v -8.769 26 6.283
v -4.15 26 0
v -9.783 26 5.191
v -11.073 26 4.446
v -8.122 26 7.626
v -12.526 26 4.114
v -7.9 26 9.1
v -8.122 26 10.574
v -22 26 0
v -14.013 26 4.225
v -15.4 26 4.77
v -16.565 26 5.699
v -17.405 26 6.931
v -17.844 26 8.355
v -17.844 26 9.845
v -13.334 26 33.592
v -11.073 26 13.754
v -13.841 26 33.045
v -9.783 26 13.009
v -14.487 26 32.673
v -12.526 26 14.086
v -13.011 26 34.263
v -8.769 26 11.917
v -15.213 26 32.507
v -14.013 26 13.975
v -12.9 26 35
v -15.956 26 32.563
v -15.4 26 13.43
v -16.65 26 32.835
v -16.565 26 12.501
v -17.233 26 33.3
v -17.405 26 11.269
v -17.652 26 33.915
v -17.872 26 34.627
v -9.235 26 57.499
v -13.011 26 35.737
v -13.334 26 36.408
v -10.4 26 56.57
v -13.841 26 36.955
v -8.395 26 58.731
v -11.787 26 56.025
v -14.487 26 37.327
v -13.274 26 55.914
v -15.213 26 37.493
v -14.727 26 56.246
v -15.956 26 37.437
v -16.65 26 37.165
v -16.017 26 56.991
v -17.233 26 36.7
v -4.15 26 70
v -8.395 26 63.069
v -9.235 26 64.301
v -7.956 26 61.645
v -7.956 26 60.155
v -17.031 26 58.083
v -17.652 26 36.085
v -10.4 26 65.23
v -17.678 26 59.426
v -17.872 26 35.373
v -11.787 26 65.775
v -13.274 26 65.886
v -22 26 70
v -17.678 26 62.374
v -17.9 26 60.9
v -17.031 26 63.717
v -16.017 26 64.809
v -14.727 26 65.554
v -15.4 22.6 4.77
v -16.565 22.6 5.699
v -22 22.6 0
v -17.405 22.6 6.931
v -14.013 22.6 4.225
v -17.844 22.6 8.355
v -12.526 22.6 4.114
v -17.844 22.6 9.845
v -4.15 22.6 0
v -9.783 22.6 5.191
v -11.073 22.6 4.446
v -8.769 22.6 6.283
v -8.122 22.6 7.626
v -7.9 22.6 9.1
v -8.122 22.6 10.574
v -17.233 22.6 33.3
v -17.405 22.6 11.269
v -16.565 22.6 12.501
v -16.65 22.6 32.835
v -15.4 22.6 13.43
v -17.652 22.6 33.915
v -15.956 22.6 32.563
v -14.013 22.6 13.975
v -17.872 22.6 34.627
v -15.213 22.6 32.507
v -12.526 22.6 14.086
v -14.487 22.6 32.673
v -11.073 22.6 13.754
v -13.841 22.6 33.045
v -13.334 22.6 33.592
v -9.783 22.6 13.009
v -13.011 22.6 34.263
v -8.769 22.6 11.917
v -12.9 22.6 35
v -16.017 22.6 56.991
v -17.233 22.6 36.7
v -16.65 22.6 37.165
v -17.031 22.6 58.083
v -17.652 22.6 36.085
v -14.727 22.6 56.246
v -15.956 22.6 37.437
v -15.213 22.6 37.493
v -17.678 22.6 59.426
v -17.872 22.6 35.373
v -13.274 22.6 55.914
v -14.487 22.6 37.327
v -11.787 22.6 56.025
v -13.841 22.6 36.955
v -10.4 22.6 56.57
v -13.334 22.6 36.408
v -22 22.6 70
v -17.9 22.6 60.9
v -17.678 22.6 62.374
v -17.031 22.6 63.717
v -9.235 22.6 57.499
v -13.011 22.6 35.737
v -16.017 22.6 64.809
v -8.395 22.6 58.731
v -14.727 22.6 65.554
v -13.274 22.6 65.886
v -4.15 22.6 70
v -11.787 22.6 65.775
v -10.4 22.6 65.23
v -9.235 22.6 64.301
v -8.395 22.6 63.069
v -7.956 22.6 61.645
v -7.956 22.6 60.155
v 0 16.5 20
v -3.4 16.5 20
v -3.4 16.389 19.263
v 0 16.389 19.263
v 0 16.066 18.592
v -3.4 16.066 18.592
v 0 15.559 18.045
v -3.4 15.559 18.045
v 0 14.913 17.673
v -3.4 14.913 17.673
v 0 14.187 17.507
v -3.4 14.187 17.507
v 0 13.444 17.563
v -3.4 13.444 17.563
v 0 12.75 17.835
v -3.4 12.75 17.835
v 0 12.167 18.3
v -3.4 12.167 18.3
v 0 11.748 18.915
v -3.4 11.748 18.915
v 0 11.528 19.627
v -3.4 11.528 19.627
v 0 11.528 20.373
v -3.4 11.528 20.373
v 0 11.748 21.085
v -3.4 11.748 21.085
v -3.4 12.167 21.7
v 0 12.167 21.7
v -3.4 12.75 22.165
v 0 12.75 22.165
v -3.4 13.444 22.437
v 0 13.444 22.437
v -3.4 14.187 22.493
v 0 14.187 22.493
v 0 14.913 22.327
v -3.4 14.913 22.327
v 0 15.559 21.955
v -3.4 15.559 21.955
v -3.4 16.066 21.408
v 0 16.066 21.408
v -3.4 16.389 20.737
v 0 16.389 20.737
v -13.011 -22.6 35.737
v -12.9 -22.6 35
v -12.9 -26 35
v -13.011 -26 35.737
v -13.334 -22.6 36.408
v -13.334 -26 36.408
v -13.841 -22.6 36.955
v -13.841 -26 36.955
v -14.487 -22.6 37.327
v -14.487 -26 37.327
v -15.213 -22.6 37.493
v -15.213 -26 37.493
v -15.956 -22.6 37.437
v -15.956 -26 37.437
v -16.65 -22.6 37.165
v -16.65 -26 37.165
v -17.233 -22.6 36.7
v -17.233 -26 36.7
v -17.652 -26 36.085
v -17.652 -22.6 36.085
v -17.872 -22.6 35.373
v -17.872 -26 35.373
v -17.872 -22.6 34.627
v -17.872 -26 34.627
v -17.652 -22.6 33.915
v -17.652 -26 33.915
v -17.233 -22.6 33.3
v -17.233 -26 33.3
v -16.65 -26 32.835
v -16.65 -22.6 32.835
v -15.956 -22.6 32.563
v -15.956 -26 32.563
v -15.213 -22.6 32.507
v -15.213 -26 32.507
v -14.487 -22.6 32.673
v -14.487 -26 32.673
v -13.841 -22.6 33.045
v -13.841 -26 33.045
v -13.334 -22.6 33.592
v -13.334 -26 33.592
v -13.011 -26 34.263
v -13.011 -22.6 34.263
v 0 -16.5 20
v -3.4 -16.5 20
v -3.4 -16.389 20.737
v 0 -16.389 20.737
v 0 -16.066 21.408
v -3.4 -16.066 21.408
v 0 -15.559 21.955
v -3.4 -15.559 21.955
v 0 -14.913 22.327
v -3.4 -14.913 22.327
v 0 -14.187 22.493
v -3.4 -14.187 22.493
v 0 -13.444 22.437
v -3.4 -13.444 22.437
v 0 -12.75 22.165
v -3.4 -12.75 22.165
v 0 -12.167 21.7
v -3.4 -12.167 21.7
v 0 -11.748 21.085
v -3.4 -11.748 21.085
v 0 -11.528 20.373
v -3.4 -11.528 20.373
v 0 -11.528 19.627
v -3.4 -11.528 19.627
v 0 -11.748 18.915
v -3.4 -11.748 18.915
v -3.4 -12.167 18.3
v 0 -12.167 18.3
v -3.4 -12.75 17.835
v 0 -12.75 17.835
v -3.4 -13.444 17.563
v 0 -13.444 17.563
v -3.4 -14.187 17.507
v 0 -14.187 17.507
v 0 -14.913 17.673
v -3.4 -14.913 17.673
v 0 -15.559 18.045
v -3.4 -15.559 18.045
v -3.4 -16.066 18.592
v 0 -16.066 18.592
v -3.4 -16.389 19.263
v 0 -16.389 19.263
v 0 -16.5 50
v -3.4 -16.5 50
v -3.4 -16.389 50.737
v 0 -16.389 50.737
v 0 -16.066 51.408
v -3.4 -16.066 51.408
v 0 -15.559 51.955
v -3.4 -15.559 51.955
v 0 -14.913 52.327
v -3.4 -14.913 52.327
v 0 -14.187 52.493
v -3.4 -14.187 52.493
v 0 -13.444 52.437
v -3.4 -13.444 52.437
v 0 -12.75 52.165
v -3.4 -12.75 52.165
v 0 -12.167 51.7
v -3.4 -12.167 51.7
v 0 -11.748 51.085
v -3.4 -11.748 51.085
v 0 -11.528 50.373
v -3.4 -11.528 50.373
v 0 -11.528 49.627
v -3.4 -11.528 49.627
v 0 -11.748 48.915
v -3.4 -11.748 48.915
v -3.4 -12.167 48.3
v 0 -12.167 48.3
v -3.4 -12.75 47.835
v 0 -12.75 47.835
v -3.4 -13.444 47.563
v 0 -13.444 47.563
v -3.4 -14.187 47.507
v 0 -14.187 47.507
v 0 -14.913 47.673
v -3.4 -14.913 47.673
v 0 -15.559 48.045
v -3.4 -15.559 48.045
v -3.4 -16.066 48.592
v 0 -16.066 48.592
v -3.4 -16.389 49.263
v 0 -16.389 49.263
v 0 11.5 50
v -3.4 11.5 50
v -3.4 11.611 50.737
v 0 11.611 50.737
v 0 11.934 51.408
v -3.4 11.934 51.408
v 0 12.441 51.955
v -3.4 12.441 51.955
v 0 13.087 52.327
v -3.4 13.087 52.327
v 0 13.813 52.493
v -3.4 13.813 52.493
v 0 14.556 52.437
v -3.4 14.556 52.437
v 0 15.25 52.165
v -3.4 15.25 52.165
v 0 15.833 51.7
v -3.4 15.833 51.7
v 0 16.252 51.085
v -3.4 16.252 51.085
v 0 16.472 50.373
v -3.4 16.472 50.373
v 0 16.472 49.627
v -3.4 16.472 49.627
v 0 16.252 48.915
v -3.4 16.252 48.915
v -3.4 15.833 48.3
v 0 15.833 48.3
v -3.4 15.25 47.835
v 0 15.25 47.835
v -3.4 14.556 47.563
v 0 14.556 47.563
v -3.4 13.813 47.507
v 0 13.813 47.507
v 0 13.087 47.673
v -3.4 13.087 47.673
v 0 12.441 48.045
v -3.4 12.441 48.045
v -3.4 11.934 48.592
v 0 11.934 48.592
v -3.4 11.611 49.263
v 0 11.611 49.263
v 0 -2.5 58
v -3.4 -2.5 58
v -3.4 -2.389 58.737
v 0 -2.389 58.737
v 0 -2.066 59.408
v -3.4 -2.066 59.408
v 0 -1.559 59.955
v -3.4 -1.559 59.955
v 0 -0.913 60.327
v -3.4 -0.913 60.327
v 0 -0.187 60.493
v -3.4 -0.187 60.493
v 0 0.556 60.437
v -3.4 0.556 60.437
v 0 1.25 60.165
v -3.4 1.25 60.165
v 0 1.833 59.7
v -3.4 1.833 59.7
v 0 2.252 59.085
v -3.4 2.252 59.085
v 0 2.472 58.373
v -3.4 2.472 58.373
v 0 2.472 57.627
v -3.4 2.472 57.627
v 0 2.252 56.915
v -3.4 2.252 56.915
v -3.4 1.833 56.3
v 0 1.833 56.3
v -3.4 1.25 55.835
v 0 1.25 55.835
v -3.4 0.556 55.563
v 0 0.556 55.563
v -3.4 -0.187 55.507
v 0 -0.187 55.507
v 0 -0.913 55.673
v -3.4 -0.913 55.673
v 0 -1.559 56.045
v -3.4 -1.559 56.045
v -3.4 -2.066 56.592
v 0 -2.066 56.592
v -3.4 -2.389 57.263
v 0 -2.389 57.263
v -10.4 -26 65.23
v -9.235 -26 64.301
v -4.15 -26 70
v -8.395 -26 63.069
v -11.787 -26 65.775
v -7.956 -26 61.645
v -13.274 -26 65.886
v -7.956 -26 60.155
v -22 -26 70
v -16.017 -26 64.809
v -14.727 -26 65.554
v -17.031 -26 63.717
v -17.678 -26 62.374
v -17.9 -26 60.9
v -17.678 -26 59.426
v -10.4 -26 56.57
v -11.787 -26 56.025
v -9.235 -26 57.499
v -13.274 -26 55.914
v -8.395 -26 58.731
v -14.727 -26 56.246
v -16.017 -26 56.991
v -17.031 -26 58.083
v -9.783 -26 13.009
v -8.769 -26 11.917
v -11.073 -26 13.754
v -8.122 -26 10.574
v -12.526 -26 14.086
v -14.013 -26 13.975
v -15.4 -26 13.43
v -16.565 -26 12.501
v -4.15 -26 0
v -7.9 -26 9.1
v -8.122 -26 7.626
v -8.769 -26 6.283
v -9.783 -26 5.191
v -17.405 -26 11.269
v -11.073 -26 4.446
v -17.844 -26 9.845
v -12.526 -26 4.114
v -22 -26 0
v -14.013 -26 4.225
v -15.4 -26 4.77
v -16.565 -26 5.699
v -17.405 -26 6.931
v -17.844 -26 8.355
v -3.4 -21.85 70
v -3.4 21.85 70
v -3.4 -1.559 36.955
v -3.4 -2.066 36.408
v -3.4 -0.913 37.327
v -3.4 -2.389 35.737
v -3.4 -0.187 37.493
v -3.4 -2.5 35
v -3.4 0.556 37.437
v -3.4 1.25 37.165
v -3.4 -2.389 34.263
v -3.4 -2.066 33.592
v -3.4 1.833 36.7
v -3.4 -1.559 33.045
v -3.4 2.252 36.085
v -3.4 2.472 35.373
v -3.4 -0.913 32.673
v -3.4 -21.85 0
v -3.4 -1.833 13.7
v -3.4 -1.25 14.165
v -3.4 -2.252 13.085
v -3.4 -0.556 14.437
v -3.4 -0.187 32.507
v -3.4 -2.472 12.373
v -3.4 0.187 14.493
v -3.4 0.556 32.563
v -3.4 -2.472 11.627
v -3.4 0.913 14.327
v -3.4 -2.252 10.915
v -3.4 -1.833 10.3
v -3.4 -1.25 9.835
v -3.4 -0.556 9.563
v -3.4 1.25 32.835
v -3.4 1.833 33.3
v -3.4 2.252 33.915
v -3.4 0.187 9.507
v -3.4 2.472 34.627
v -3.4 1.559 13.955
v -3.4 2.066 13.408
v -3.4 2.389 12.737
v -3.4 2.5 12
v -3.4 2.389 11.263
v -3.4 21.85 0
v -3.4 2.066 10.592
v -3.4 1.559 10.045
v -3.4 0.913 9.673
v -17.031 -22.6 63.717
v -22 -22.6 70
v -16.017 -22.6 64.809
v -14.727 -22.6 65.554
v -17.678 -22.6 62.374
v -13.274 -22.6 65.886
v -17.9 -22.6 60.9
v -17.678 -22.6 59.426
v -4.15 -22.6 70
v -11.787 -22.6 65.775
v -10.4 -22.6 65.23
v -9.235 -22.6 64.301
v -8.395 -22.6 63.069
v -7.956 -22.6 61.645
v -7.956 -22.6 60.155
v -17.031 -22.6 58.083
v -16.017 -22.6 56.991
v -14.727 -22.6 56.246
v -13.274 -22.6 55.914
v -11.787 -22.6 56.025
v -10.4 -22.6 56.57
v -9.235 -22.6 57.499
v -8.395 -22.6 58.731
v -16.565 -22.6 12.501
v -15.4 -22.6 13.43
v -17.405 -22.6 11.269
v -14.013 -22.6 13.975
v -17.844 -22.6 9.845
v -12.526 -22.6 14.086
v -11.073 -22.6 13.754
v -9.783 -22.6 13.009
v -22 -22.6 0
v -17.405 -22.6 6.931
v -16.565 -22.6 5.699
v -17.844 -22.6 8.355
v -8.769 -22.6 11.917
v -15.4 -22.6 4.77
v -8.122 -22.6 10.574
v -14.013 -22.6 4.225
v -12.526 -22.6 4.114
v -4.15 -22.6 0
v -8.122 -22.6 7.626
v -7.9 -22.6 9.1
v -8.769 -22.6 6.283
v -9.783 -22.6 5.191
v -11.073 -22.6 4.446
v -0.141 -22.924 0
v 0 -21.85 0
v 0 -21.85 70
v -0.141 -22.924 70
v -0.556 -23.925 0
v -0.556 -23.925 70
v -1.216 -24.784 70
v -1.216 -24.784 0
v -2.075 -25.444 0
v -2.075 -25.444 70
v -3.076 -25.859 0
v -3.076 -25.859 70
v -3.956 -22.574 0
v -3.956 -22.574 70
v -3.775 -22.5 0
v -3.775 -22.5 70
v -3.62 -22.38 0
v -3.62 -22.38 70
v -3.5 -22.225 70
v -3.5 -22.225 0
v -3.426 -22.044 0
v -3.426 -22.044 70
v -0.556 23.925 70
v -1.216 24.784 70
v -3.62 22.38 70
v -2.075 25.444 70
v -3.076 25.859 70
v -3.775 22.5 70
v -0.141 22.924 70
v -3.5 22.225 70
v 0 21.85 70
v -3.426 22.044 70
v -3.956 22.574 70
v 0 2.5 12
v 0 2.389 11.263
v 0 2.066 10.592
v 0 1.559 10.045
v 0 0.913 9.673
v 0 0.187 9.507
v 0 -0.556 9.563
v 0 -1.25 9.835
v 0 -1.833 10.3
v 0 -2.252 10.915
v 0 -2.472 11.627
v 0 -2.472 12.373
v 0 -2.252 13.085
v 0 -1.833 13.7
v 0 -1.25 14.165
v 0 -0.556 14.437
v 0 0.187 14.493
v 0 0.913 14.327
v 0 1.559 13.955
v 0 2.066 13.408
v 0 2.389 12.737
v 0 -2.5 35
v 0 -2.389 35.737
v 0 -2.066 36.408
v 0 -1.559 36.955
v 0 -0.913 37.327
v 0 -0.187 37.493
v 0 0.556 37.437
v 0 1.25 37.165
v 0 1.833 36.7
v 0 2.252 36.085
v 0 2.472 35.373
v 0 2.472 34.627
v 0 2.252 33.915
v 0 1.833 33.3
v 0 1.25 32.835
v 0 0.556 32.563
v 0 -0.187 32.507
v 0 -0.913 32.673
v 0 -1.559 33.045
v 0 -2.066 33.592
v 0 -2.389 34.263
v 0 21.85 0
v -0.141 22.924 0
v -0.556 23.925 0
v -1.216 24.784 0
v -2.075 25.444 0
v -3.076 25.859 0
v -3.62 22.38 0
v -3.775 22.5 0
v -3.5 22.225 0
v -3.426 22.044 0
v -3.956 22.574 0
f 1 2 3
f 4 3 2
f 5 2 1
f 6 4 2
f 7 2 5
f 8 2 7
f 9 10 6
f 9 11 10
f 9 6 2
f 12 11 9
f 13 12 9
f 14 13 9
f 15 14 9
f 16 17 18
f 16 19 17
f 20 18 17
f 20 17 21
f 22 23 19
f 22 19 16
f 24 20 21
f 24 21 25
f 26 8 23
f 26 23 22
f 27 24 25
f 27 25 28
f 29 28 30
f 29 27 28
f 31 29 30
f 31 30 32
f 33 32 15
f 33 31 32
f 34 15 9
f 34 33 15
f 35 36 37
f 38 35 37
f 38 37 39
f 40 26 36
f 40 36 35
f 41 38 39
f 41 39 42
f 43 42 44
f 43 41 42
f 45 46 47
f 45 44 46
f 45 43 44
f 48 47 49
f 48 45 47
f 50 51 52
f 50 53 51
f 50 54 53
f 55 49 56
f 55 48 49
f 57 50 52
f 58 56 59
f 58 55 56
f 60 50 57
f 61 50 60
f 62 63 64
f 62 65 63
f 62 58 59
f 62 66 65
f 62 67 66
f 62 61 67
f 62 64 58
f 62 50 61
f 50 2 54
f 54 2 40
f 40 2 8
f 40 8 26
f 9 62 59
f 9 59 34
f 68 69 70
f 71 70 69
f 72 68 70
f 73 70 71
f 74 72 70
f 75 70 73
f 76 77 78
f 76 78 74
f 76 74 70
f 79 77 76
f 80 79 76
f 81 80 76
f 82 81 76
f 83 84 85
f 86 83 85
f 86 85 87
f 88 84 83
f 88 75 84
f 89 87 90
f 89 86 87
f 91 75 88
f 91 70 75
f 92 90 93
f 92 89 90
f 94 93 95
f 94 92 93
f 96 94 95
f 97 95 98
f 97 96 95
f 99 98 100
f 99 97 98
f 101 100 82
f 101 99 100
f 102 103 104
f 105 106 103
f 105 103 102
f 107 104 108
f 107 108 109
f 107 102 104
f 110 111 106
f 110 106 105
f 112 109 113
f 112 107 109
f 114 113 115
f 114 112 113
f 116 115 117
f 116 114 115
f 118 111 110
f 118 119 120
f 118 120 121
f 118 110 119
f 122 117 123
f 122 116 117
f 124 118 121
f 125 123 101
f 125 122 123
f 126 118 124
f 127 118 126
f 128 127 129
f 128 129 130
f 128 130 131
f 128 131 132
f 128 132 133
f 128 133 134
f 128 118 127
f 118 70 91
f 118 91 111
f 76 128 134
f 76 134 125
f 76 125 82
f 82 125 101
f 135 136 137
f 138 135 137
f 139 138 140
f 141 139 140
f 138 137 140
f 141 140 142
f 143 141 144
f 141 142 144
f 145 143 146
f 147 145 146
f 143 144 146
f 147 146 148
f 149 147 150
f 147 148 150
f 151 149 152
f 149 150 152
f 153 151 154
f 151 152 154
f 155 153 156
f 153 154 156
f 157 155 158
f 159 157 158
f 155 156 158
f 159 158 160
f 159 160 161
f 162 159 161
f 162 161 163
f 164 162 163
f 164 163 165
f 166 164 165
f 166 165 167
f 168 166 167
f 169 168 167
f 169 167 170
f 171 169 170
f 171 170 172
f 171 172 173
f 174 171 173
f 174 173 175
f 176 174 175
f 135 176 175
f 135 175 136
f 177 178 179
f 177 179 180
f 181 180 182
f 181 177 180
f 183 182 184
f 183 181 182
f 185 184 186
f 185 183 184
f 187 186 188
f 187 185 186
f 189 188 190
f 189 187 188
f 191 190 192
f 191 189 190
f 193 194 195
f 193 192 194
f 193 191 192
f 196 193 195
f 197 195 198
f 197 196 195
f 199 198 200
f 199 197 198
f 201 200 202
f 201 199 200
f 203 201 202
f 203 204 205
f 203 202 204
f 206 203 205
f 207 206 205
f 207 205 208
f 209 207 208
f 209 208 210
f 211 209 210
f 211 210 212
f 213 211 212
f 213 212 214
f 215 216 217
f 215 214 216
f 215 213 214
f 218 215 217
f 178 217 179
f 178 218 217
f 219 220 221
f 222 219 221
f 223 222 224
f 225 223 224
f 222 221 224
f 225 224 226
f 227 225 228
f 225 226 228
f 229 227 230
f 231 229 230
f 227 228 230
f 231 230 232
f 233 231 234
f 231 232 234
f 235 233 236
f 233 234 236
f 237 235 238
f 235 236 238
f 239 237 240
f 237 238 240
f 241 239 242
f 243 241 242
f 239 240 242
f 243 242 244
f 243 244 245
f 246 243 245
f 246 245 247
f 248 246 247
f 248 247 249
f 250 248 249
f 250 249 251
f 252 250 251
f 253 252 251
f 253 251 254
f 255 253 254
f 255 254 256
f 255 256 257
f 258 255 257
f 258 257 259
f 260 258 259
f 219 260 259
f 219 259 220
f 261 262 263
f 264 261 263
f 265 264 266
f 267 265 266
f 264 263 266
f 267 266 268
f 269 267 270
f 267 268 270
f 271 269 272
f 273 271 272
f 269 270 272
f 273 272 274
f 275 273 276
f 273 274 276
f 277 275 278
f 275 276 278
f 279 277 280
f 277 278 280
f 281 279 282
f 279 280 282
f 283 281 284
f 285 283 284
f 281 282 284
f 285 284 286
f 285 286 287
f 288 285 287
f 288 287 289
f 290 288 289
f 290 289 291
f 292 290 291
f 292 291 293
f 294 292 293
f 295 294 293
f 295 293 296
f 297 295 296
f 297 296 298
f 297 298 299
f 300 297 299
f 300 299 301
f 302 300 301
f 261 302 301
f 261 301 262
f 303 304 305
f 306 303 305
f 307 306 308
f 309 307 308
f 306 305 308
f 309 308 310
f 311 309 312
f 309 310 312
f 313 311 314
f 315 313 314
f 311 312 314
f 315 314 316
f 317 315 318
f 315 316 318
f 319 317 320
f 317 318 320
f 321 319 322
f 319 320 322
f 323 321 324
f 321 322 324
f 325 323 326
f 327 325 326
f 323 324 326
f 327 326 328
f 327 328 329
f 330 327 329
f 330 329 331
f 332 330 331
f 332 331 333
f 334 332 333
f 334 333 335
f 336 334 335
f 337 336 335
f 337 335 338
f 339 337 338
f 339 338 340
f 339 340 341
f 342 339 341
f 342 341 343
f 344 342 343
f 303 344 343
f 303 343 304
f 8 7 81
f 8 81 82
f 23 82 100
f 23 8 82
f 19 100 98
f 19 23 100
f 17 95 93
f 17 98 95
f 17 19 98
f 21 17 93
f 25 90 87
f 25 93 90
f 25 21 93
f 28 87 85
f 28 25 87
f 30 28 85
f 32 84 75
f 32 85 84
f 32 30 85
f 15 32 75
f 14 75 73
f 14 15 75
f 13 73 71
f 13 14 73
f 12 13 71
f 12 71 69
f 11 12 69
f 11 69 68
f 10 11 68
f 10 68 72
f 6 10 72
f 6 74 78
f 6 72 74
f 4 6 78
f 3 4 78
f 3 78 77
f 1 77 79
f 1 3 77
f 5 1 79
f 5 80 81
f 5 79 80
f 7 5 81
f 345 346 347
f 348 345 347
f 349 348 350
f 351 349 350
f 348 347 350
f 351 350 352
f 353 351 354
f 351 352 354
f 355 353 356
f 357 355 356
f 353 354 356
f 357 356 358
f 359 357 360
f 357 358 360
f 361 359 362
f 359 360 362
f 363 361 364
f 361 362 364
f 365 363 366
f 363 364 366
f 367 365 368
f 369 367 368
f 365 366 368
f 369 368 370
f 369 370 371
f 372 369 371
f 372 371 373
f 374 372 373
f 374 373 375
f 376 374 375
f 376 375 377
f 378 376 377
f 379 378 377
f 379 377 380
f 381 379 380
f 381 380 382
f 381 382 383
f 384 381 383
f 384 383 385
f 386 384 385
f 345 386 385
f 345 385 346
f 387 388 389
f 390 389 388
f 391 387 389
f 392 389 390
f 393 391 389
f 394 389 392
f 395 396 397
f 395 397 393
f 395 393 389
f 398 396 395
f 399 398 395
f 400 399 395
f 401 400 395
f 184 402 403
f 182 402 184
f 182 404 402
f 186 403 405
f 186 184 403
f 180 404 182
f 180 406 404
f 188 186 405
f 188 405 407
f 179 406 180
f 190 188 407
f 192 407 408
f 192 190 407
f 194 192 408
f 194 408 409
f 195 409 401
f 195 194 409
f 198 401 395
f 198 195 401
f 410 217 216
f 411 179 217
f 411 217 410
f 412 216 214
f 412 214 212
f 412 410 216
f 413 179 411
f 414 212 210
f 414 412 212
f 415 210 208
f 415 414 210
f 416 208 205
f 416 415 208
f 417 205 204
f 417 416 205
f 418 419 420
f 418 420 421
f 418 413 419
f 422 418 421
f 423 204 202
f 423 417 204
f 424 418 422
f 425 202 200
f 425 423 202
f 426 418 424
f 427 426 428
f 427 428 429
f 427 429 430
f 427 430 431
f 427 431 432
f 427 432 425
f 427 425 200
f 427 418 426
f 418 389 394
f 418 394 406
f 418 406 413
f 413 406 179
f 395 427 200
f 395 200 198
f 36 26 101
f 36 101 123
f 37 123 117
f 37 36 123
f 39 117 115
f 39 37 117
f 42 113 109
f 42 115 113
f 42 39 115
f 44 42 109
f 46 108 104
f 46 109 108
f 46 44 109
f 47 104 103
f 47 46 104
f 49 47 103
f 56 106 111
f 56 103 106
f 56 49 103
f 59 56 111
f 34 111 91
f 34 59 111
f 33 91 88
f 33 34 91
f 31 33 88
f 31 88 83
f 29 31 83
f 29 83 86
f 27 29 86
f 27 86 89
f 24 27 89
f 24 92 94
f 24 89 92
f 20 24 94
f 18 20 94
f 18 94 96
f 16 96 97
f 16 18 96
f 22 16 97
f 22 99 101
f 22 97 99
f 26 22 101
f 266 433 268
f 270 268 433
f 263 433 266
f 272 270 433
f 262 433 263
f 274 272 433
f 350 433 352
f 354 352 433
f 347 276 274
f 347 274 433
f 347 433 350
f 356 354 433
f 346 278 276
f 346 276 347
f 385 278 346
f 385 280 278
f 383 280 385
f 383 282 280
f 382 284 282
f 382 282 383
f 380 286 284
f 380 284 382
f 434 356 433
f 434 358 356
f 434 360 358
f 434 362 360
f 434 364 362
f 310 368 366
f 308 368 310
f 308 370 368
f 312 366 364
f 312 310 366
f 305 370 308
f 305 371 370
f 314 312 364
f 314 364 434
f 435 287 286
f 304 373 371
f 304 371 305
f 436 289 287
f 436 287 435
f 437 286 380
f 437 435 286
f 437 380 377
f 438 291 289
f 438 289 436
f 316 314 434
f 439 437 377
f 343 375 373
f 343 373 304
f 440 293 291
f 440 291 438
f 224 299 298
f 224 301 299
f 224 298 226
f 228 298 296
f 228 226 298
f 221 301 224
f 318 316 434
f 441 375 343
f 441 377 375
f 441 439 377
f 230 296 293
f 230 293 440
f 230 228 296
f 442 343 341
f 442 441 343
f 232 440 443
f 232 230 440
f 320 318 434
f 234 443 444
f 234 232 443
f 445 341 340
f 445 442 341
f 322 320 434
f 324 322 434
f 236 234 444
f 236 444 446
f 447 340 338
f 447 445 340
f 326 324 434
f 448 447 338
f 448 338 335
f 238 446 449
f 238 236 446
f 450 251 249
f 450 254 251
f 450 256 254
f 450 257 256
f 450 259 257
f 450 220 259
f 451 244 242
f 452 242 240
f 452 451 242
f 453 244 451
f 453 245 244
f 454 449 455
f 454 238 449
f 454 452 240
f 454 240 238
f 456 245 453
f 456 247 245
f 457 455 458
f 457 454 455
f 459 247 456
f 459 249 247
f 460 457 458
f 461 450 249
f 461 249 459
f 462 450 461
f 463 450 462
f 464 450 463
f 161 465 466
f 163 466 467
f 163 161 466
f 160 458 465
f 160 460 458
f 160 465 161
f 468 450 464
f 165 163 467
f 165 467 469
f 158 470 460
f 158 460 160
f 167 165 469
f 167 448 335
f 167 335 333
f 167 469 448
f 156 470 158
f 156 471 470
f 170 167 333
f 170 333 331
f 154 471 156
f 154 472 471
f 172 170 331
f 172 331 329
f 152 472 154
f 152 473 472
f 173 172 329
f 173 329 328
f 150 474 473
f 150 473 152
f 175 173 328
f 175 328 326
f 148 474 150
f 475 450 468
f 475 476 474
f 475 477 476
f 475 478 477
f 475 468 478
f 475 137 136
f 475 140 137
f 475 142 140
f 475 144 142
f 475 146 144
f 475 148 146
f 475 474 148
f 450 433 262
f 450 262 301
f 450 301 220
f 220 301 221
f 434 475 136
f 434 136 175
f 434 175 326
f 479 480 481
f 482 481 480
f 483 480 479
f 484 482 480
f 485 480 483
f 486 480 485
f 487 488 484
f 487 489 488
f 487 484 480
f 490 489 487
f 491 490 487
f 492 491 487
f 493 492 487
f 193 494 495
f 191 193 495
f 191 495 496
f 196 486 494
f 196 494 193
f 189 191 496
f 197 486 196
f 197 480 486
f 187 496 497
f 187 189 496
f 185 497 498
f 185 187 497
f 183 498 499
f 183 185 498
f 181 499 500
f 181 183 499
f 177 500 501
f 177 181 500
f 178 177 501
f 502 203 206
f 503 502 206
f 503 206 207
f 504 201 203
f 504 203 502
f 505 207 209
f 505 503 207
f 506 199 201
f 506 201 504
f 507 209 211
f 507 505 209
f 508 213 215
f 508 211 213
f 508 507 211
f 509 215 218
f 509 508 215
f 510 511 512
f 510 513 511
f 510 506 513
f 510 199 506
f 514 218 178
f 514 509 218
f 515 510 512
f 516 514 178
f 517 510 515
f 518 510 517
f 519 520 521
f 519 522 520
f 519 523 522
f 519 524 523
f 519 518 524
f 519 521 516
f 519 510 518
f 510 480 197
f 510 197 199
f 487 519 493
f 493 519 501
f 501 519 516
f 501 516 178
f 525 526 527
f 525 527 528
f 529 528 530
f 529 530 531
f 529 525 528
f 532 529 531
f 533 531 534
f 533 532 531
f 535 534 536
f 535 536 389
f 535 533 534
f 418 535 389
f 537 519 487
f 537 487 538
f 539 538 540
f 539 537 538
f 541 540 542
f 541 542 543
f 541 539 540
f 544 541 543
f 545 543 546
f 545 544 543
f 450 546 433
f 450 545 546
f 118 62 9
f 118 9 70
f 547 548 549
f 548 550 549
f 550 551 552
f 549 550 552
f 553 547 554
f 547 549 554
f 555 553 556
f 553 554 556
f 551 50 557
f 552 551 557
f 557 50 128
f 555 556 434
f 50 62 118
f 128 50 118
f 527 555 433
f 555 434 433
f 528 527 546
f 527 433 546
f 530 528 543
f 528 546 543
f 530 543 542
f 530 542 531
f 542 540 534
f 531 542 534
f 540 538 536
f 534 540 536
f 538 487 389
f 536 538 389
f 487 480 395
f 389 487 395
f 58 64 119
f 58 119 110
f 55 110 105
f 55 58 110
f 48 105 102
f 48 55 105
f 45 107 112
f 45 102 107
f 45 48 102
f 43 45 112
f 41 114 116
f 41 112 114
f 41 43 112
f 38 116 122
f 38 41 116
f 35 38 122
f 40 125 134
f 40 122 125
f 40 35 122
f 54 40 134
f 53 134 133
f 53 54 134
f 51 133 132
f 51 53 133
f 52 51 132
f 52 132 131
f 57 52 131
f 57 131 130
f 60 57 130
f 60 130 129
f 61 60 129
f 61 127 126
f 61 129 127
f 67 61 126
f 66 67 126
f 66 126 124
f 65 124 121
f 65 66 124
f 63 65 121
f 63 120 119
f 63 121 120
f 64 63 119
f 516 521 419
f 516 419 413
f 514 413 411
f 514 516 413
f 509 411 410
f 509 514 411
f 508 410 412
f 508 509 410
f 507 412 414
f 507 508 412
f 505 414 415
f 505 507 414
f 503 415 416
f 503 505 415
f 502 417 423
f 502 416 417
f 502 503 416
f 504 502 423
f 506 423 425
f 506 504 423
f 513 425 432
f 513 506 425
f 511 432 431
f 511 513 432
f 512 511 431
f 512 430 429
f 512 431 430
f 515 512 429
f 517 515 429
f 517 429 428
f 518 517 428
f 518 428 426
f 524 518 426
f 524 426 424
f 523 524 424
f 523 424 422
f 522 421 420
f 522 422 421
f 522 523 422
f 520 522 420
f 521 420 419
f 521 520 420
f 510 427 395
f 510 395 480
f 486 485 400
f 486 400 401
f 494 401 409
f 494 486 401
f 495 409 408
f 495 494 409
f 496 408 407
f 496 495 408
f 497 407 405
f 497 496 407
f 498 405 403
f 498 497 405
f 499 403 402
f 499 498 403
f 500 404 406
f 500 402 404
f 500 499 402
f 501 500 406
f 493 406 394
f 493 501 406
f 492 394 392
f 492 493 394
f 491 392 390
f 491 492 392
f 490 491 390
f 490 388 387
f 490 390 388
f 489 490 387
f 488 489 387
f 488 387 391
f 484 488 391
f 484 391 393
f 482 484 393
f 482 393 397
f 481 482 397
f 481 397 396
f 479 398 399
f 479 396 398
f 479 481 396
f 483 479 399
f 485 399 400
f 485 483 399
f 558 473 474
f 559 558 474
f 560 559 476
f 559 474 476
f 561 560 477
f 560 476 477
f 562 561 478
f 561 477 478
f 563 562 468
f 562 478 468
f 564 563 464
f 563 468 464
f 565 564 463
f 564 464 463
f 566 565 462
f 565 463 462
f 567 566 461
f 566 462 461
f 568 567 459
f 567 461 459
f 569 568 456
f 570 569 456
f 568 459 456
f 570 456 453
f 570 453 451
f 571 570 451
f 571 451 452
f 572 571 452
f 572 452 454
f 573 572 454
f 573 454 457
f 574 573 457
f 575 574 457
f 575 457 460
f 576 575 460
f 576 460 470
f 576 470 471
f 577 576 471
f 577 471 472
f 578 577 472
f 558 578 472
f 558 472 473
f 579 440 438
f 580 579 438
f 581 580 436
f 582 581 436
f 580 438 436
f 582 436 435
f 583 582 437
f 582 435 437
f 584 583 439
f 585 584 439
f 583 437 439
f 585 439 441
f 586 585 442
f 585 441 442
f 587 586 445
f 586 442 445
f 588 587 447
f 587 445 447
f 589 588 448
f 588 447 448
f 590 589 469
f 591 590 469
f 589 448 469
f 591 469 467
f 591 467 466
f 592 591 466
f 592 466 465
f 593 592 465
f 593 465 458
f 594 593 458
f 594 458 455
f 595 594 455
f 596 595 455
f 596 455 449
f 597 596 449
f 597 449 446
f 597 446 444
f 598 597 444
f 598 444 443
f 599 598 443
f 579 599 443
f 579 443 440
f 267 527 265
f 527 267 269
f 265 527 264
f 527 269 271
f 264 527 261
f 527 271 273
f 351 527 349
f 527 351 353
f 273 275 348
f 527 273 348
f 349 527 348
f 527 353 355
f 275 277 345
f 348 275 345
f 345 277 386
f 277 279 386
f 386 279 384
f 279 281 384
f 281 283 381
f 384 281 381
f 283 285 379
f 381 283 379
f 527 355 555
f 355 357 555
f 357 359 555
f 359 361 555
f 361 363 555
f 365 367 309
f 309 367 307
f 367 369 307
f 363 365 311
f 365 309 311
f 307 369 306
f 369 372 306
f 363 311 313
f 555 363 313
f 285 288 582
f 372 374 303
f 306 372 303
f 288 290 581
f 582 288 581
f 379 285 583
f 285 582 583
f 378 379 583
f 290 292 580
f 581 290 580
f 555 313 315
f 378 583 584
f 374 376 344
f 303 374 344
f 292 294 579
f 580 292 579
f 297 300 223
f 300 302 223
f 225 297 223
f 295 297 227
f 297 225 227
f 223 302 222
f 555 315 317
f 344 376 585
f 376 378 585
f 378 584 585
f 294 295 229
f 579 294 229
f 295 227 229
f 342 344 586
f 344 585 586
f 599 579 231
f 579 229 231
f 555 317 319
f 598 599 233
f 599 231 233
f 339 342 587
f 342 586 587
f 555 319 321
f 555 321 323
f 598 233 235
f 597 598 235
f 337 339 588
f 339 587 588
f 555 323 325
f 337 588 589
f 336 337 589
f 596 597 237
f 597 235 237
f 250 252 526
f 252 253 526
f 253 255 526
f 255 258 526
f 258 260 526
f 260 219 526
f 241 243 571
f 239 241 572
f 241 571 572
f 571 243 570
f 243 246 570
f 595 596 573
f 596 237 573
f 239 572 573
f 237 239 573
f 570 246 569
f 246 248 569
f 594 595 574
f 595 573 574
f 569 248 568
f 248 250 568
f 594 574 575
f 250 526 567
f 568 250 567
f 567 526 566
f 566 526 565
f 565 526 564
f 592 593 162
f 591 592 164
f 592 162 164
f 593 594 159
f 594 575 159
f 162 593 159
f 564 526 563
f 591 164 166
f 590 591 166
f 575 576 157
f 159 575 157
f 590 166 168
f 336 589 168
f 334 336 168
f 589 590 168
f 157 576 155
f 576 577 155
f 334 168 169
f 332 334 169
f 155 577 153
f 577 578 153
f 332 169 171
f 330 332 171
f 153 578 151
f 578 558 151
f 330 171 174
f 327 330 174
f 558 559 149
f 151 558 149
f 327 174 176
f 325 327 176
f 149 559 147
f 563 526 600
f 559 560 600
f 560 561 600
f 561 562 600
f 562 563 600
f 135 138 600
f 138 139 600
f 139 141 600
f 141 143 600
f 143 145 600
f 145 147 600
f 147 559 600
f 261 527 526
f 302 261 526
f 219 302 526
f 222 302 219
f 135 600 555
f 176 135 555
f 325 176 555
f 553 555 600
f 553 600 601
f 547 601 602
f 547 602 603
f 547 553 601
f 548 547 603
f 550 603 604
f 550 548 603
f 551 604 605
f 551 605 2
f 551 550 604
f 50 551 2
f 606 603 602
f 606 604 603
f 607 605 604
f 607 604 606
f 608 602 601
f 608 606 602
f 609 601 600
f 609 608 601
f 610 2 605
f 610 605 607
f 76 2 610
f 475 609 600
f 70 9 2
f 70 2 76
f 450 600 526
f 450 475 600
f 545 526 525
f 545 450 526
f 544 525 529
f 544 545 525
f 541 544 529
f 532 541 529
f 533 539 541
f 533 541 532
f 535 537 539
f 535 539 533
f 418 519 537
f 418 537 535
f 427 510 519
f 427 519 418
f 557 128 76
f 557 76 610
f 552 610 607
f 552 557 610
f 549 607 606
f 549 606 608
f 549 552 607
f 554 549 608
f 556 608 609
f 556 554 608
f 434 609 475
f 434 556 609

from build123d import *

# Parameters (mm, degrees)
SKETCH11_W                     = 3.4
SKETCH11_H                     = 52
BASE_FLANGE3_DEPTH             = 70
EDGE_FLANGE1_STRIP_W           = 15.1
EDGE_FLANGE1_STRIP_H           = 3.4
EDGE_FLANGE1_STRIP_CUT_DEPTH   = 70
EDGE_FLANGE1_STRIP_2_W         = 15.1
EDGE_FLANGE1_STRIP_2_H         = 3.4
EDGE_FLANGE1_STRIP_CUT_2_DEPTH = 70
EDGE_FLANGE1_DEPTH             = 70
EDGE_FLANGE1_BEND_DEPTH        = 70
CUT_EXTRUDE1_DEPTH             = 89.011135659
CUT_EXTRUDE1_DEPTH_BACK        = 89.011135659
SKETCH25_R                     = 2.5
SKETCH25_R_2                   = 5
SKETCH23_R                     = 2.5
CUT_EXTRUDE2_DEPTH             = 77.954272136


# Sheet-metal steps are written as plain solids
with BuildPart() as part:
    # Sketch11 → Base-Flange3 (new body)
    with BuildSketch(Plane.XY):
        with Locations((-1.7, 0)):
            Rectangle(SKETCH11_W, SKETCH11_H)
    extrude(amount=BASE_FLANGE3_DEPTH)

    # Edge-Flange1 strip (across the edge) → Edge-Flange1 strip cut (cut)
    with BuildSketch(Plane(origin=(-3.4, 26, 70), x_dir=(0, -1, 0), z_dir=(0, 0, -1))):
        with Locations((-3.4, -1.7)):
            Rectangle(EDGE_FLANGE1_STRIP_W, EDGE_FLANGE1_STRIP_H)
    extrude(amount=EDGE_FLANGE1_STRIP_CUT_DEPTH, mode=Mode.SUBTRACT)

    # Edge-Flange1 strip 2 (across the edge) → Edge-Flange1 strip cut 2 (cut)
    with BuildSketch(Plane(origin=(-3.4, -26, 0), x_dir=(0, 1, 0), z_dir=(0, 0, 1))):
        with Locations((-3.4, -1.7)):
            Rectangle(EDGE_FLANGE1_STRIP_2_W, EDGE_FLANGE1_STRIP_2_H)
    extrude(amount=EDGE_FLANGE1_STRIP_CUT_2_DEPTH, mode=Mode.SUBTRACT)

    # Edge-Flange1 section (across the edge) → Edge-Flange1 (add)
    with BuildSketch(Plane(origin=(-3.4, 26, 70), x_dir=(0, -1, 0), z_dir=(0, 0, -1))):
        with BuildLine():
            Line((0, 0.75), (0, 18.6))
            Line((0, 18.6), (3.4, 18.6))
            Line((3.4, 18.6), (3.4, 0.75))
            ThreePointArc((3.4, 0.75), (3.619669914, 0.219669914), (4.15, 0))
            Line((4.15, 0), (4.15, -3.4))
            ThreePointArc((4.15, -3.4), (1.215506858, -2.184493142), (0, 0.75))
        make_face()
    extrude(amount=EDGE_FLANGE1_DEPTH)

    # Edge-Flange1 section 2 (across the edge) → Edge-Flange1 bend (add)
    with BuildSketch(Plane(origin=(-3.4, -26, 0), x_dir=(0, 1, 0), z_dir=(0, 0, 1))):
        with BuildLine():
            Line((0, 0.75), (0, 18.6))
            Line((0, 18.6), (3.4, 18.6))
            Line((3.4, 18.6), (3.4, 0.75))
            ThreePointArc((3.4, 0.75), (3.619669914, 0.219669914), (4.15, 0))
            Line((4.15, 0), (4.15, -3.4))
            ThreePointArc((4.15, -3.4), (1.215506858, -2.184493142), (0, 0.75))
        make_face()
    extrude(amount=EDGE_FLANGE1_BEND_DEPTH)

    # Sketch25 → Cut-Extrude1 (cut, two sides: drawn at the far end of the back side and taken through both)
    with BuildSketch(Plane.XZ.offset(-22.6).offset(-CUT_EXTRUDE1_DEPTH_BACK)):
        with Locations((-15.4, 35)):
            Circle(SKETCH25_R)
        with Locations((-12.9, 9.1)):
            Circle(SKETCH25_R_2)
        with Locations(Location((-12.9, 60.9, 0), (0, 0, 180))):
            Circle(SKETCH25_R_2)
    extrude(amount=CUT_EXTRUDE1_DEPTH + CUT_EXTRUDE1_DEPTH_BACK, mode=Mode.SUBTRACT)

    # Sketch23 → Cut-Extrude2 (cut, through all)
    with BuildSketch(Plane.ZY.offset(3.4)):
        with Locations(Location((20, -14, 0), (0, 0, 270))):
            Circle(SKETCH23_R)
        with Locations(Location((50, -14, 0), (0, 0, 270))):
            Circle(SKETCH23_R)
        with Locations(Location((20, 14, 0), (0, 0, 90))):
            Circle(SKETCH23_R)
        with Locations(Location((50, 14, 0), (0, 0, 270))):
            Circle(SKETCH23_R)
        with Locations(Location((35, 0, 0), (0, 0, 270))):
            Circle(SKETCH23_R)
        with Locations(Location((58, 0, 0), (0, 0, 270))):
            Circle(SKETCH23_R)
        with Locations(Location((12, 0, 0), (0, 0, 90))):
            Circle(SKETCH23_R)
    extrude(amount=-CUT_EXTRUDE2_DEPTH, mode=Mode.SUBTRACT)


solid = part.part
